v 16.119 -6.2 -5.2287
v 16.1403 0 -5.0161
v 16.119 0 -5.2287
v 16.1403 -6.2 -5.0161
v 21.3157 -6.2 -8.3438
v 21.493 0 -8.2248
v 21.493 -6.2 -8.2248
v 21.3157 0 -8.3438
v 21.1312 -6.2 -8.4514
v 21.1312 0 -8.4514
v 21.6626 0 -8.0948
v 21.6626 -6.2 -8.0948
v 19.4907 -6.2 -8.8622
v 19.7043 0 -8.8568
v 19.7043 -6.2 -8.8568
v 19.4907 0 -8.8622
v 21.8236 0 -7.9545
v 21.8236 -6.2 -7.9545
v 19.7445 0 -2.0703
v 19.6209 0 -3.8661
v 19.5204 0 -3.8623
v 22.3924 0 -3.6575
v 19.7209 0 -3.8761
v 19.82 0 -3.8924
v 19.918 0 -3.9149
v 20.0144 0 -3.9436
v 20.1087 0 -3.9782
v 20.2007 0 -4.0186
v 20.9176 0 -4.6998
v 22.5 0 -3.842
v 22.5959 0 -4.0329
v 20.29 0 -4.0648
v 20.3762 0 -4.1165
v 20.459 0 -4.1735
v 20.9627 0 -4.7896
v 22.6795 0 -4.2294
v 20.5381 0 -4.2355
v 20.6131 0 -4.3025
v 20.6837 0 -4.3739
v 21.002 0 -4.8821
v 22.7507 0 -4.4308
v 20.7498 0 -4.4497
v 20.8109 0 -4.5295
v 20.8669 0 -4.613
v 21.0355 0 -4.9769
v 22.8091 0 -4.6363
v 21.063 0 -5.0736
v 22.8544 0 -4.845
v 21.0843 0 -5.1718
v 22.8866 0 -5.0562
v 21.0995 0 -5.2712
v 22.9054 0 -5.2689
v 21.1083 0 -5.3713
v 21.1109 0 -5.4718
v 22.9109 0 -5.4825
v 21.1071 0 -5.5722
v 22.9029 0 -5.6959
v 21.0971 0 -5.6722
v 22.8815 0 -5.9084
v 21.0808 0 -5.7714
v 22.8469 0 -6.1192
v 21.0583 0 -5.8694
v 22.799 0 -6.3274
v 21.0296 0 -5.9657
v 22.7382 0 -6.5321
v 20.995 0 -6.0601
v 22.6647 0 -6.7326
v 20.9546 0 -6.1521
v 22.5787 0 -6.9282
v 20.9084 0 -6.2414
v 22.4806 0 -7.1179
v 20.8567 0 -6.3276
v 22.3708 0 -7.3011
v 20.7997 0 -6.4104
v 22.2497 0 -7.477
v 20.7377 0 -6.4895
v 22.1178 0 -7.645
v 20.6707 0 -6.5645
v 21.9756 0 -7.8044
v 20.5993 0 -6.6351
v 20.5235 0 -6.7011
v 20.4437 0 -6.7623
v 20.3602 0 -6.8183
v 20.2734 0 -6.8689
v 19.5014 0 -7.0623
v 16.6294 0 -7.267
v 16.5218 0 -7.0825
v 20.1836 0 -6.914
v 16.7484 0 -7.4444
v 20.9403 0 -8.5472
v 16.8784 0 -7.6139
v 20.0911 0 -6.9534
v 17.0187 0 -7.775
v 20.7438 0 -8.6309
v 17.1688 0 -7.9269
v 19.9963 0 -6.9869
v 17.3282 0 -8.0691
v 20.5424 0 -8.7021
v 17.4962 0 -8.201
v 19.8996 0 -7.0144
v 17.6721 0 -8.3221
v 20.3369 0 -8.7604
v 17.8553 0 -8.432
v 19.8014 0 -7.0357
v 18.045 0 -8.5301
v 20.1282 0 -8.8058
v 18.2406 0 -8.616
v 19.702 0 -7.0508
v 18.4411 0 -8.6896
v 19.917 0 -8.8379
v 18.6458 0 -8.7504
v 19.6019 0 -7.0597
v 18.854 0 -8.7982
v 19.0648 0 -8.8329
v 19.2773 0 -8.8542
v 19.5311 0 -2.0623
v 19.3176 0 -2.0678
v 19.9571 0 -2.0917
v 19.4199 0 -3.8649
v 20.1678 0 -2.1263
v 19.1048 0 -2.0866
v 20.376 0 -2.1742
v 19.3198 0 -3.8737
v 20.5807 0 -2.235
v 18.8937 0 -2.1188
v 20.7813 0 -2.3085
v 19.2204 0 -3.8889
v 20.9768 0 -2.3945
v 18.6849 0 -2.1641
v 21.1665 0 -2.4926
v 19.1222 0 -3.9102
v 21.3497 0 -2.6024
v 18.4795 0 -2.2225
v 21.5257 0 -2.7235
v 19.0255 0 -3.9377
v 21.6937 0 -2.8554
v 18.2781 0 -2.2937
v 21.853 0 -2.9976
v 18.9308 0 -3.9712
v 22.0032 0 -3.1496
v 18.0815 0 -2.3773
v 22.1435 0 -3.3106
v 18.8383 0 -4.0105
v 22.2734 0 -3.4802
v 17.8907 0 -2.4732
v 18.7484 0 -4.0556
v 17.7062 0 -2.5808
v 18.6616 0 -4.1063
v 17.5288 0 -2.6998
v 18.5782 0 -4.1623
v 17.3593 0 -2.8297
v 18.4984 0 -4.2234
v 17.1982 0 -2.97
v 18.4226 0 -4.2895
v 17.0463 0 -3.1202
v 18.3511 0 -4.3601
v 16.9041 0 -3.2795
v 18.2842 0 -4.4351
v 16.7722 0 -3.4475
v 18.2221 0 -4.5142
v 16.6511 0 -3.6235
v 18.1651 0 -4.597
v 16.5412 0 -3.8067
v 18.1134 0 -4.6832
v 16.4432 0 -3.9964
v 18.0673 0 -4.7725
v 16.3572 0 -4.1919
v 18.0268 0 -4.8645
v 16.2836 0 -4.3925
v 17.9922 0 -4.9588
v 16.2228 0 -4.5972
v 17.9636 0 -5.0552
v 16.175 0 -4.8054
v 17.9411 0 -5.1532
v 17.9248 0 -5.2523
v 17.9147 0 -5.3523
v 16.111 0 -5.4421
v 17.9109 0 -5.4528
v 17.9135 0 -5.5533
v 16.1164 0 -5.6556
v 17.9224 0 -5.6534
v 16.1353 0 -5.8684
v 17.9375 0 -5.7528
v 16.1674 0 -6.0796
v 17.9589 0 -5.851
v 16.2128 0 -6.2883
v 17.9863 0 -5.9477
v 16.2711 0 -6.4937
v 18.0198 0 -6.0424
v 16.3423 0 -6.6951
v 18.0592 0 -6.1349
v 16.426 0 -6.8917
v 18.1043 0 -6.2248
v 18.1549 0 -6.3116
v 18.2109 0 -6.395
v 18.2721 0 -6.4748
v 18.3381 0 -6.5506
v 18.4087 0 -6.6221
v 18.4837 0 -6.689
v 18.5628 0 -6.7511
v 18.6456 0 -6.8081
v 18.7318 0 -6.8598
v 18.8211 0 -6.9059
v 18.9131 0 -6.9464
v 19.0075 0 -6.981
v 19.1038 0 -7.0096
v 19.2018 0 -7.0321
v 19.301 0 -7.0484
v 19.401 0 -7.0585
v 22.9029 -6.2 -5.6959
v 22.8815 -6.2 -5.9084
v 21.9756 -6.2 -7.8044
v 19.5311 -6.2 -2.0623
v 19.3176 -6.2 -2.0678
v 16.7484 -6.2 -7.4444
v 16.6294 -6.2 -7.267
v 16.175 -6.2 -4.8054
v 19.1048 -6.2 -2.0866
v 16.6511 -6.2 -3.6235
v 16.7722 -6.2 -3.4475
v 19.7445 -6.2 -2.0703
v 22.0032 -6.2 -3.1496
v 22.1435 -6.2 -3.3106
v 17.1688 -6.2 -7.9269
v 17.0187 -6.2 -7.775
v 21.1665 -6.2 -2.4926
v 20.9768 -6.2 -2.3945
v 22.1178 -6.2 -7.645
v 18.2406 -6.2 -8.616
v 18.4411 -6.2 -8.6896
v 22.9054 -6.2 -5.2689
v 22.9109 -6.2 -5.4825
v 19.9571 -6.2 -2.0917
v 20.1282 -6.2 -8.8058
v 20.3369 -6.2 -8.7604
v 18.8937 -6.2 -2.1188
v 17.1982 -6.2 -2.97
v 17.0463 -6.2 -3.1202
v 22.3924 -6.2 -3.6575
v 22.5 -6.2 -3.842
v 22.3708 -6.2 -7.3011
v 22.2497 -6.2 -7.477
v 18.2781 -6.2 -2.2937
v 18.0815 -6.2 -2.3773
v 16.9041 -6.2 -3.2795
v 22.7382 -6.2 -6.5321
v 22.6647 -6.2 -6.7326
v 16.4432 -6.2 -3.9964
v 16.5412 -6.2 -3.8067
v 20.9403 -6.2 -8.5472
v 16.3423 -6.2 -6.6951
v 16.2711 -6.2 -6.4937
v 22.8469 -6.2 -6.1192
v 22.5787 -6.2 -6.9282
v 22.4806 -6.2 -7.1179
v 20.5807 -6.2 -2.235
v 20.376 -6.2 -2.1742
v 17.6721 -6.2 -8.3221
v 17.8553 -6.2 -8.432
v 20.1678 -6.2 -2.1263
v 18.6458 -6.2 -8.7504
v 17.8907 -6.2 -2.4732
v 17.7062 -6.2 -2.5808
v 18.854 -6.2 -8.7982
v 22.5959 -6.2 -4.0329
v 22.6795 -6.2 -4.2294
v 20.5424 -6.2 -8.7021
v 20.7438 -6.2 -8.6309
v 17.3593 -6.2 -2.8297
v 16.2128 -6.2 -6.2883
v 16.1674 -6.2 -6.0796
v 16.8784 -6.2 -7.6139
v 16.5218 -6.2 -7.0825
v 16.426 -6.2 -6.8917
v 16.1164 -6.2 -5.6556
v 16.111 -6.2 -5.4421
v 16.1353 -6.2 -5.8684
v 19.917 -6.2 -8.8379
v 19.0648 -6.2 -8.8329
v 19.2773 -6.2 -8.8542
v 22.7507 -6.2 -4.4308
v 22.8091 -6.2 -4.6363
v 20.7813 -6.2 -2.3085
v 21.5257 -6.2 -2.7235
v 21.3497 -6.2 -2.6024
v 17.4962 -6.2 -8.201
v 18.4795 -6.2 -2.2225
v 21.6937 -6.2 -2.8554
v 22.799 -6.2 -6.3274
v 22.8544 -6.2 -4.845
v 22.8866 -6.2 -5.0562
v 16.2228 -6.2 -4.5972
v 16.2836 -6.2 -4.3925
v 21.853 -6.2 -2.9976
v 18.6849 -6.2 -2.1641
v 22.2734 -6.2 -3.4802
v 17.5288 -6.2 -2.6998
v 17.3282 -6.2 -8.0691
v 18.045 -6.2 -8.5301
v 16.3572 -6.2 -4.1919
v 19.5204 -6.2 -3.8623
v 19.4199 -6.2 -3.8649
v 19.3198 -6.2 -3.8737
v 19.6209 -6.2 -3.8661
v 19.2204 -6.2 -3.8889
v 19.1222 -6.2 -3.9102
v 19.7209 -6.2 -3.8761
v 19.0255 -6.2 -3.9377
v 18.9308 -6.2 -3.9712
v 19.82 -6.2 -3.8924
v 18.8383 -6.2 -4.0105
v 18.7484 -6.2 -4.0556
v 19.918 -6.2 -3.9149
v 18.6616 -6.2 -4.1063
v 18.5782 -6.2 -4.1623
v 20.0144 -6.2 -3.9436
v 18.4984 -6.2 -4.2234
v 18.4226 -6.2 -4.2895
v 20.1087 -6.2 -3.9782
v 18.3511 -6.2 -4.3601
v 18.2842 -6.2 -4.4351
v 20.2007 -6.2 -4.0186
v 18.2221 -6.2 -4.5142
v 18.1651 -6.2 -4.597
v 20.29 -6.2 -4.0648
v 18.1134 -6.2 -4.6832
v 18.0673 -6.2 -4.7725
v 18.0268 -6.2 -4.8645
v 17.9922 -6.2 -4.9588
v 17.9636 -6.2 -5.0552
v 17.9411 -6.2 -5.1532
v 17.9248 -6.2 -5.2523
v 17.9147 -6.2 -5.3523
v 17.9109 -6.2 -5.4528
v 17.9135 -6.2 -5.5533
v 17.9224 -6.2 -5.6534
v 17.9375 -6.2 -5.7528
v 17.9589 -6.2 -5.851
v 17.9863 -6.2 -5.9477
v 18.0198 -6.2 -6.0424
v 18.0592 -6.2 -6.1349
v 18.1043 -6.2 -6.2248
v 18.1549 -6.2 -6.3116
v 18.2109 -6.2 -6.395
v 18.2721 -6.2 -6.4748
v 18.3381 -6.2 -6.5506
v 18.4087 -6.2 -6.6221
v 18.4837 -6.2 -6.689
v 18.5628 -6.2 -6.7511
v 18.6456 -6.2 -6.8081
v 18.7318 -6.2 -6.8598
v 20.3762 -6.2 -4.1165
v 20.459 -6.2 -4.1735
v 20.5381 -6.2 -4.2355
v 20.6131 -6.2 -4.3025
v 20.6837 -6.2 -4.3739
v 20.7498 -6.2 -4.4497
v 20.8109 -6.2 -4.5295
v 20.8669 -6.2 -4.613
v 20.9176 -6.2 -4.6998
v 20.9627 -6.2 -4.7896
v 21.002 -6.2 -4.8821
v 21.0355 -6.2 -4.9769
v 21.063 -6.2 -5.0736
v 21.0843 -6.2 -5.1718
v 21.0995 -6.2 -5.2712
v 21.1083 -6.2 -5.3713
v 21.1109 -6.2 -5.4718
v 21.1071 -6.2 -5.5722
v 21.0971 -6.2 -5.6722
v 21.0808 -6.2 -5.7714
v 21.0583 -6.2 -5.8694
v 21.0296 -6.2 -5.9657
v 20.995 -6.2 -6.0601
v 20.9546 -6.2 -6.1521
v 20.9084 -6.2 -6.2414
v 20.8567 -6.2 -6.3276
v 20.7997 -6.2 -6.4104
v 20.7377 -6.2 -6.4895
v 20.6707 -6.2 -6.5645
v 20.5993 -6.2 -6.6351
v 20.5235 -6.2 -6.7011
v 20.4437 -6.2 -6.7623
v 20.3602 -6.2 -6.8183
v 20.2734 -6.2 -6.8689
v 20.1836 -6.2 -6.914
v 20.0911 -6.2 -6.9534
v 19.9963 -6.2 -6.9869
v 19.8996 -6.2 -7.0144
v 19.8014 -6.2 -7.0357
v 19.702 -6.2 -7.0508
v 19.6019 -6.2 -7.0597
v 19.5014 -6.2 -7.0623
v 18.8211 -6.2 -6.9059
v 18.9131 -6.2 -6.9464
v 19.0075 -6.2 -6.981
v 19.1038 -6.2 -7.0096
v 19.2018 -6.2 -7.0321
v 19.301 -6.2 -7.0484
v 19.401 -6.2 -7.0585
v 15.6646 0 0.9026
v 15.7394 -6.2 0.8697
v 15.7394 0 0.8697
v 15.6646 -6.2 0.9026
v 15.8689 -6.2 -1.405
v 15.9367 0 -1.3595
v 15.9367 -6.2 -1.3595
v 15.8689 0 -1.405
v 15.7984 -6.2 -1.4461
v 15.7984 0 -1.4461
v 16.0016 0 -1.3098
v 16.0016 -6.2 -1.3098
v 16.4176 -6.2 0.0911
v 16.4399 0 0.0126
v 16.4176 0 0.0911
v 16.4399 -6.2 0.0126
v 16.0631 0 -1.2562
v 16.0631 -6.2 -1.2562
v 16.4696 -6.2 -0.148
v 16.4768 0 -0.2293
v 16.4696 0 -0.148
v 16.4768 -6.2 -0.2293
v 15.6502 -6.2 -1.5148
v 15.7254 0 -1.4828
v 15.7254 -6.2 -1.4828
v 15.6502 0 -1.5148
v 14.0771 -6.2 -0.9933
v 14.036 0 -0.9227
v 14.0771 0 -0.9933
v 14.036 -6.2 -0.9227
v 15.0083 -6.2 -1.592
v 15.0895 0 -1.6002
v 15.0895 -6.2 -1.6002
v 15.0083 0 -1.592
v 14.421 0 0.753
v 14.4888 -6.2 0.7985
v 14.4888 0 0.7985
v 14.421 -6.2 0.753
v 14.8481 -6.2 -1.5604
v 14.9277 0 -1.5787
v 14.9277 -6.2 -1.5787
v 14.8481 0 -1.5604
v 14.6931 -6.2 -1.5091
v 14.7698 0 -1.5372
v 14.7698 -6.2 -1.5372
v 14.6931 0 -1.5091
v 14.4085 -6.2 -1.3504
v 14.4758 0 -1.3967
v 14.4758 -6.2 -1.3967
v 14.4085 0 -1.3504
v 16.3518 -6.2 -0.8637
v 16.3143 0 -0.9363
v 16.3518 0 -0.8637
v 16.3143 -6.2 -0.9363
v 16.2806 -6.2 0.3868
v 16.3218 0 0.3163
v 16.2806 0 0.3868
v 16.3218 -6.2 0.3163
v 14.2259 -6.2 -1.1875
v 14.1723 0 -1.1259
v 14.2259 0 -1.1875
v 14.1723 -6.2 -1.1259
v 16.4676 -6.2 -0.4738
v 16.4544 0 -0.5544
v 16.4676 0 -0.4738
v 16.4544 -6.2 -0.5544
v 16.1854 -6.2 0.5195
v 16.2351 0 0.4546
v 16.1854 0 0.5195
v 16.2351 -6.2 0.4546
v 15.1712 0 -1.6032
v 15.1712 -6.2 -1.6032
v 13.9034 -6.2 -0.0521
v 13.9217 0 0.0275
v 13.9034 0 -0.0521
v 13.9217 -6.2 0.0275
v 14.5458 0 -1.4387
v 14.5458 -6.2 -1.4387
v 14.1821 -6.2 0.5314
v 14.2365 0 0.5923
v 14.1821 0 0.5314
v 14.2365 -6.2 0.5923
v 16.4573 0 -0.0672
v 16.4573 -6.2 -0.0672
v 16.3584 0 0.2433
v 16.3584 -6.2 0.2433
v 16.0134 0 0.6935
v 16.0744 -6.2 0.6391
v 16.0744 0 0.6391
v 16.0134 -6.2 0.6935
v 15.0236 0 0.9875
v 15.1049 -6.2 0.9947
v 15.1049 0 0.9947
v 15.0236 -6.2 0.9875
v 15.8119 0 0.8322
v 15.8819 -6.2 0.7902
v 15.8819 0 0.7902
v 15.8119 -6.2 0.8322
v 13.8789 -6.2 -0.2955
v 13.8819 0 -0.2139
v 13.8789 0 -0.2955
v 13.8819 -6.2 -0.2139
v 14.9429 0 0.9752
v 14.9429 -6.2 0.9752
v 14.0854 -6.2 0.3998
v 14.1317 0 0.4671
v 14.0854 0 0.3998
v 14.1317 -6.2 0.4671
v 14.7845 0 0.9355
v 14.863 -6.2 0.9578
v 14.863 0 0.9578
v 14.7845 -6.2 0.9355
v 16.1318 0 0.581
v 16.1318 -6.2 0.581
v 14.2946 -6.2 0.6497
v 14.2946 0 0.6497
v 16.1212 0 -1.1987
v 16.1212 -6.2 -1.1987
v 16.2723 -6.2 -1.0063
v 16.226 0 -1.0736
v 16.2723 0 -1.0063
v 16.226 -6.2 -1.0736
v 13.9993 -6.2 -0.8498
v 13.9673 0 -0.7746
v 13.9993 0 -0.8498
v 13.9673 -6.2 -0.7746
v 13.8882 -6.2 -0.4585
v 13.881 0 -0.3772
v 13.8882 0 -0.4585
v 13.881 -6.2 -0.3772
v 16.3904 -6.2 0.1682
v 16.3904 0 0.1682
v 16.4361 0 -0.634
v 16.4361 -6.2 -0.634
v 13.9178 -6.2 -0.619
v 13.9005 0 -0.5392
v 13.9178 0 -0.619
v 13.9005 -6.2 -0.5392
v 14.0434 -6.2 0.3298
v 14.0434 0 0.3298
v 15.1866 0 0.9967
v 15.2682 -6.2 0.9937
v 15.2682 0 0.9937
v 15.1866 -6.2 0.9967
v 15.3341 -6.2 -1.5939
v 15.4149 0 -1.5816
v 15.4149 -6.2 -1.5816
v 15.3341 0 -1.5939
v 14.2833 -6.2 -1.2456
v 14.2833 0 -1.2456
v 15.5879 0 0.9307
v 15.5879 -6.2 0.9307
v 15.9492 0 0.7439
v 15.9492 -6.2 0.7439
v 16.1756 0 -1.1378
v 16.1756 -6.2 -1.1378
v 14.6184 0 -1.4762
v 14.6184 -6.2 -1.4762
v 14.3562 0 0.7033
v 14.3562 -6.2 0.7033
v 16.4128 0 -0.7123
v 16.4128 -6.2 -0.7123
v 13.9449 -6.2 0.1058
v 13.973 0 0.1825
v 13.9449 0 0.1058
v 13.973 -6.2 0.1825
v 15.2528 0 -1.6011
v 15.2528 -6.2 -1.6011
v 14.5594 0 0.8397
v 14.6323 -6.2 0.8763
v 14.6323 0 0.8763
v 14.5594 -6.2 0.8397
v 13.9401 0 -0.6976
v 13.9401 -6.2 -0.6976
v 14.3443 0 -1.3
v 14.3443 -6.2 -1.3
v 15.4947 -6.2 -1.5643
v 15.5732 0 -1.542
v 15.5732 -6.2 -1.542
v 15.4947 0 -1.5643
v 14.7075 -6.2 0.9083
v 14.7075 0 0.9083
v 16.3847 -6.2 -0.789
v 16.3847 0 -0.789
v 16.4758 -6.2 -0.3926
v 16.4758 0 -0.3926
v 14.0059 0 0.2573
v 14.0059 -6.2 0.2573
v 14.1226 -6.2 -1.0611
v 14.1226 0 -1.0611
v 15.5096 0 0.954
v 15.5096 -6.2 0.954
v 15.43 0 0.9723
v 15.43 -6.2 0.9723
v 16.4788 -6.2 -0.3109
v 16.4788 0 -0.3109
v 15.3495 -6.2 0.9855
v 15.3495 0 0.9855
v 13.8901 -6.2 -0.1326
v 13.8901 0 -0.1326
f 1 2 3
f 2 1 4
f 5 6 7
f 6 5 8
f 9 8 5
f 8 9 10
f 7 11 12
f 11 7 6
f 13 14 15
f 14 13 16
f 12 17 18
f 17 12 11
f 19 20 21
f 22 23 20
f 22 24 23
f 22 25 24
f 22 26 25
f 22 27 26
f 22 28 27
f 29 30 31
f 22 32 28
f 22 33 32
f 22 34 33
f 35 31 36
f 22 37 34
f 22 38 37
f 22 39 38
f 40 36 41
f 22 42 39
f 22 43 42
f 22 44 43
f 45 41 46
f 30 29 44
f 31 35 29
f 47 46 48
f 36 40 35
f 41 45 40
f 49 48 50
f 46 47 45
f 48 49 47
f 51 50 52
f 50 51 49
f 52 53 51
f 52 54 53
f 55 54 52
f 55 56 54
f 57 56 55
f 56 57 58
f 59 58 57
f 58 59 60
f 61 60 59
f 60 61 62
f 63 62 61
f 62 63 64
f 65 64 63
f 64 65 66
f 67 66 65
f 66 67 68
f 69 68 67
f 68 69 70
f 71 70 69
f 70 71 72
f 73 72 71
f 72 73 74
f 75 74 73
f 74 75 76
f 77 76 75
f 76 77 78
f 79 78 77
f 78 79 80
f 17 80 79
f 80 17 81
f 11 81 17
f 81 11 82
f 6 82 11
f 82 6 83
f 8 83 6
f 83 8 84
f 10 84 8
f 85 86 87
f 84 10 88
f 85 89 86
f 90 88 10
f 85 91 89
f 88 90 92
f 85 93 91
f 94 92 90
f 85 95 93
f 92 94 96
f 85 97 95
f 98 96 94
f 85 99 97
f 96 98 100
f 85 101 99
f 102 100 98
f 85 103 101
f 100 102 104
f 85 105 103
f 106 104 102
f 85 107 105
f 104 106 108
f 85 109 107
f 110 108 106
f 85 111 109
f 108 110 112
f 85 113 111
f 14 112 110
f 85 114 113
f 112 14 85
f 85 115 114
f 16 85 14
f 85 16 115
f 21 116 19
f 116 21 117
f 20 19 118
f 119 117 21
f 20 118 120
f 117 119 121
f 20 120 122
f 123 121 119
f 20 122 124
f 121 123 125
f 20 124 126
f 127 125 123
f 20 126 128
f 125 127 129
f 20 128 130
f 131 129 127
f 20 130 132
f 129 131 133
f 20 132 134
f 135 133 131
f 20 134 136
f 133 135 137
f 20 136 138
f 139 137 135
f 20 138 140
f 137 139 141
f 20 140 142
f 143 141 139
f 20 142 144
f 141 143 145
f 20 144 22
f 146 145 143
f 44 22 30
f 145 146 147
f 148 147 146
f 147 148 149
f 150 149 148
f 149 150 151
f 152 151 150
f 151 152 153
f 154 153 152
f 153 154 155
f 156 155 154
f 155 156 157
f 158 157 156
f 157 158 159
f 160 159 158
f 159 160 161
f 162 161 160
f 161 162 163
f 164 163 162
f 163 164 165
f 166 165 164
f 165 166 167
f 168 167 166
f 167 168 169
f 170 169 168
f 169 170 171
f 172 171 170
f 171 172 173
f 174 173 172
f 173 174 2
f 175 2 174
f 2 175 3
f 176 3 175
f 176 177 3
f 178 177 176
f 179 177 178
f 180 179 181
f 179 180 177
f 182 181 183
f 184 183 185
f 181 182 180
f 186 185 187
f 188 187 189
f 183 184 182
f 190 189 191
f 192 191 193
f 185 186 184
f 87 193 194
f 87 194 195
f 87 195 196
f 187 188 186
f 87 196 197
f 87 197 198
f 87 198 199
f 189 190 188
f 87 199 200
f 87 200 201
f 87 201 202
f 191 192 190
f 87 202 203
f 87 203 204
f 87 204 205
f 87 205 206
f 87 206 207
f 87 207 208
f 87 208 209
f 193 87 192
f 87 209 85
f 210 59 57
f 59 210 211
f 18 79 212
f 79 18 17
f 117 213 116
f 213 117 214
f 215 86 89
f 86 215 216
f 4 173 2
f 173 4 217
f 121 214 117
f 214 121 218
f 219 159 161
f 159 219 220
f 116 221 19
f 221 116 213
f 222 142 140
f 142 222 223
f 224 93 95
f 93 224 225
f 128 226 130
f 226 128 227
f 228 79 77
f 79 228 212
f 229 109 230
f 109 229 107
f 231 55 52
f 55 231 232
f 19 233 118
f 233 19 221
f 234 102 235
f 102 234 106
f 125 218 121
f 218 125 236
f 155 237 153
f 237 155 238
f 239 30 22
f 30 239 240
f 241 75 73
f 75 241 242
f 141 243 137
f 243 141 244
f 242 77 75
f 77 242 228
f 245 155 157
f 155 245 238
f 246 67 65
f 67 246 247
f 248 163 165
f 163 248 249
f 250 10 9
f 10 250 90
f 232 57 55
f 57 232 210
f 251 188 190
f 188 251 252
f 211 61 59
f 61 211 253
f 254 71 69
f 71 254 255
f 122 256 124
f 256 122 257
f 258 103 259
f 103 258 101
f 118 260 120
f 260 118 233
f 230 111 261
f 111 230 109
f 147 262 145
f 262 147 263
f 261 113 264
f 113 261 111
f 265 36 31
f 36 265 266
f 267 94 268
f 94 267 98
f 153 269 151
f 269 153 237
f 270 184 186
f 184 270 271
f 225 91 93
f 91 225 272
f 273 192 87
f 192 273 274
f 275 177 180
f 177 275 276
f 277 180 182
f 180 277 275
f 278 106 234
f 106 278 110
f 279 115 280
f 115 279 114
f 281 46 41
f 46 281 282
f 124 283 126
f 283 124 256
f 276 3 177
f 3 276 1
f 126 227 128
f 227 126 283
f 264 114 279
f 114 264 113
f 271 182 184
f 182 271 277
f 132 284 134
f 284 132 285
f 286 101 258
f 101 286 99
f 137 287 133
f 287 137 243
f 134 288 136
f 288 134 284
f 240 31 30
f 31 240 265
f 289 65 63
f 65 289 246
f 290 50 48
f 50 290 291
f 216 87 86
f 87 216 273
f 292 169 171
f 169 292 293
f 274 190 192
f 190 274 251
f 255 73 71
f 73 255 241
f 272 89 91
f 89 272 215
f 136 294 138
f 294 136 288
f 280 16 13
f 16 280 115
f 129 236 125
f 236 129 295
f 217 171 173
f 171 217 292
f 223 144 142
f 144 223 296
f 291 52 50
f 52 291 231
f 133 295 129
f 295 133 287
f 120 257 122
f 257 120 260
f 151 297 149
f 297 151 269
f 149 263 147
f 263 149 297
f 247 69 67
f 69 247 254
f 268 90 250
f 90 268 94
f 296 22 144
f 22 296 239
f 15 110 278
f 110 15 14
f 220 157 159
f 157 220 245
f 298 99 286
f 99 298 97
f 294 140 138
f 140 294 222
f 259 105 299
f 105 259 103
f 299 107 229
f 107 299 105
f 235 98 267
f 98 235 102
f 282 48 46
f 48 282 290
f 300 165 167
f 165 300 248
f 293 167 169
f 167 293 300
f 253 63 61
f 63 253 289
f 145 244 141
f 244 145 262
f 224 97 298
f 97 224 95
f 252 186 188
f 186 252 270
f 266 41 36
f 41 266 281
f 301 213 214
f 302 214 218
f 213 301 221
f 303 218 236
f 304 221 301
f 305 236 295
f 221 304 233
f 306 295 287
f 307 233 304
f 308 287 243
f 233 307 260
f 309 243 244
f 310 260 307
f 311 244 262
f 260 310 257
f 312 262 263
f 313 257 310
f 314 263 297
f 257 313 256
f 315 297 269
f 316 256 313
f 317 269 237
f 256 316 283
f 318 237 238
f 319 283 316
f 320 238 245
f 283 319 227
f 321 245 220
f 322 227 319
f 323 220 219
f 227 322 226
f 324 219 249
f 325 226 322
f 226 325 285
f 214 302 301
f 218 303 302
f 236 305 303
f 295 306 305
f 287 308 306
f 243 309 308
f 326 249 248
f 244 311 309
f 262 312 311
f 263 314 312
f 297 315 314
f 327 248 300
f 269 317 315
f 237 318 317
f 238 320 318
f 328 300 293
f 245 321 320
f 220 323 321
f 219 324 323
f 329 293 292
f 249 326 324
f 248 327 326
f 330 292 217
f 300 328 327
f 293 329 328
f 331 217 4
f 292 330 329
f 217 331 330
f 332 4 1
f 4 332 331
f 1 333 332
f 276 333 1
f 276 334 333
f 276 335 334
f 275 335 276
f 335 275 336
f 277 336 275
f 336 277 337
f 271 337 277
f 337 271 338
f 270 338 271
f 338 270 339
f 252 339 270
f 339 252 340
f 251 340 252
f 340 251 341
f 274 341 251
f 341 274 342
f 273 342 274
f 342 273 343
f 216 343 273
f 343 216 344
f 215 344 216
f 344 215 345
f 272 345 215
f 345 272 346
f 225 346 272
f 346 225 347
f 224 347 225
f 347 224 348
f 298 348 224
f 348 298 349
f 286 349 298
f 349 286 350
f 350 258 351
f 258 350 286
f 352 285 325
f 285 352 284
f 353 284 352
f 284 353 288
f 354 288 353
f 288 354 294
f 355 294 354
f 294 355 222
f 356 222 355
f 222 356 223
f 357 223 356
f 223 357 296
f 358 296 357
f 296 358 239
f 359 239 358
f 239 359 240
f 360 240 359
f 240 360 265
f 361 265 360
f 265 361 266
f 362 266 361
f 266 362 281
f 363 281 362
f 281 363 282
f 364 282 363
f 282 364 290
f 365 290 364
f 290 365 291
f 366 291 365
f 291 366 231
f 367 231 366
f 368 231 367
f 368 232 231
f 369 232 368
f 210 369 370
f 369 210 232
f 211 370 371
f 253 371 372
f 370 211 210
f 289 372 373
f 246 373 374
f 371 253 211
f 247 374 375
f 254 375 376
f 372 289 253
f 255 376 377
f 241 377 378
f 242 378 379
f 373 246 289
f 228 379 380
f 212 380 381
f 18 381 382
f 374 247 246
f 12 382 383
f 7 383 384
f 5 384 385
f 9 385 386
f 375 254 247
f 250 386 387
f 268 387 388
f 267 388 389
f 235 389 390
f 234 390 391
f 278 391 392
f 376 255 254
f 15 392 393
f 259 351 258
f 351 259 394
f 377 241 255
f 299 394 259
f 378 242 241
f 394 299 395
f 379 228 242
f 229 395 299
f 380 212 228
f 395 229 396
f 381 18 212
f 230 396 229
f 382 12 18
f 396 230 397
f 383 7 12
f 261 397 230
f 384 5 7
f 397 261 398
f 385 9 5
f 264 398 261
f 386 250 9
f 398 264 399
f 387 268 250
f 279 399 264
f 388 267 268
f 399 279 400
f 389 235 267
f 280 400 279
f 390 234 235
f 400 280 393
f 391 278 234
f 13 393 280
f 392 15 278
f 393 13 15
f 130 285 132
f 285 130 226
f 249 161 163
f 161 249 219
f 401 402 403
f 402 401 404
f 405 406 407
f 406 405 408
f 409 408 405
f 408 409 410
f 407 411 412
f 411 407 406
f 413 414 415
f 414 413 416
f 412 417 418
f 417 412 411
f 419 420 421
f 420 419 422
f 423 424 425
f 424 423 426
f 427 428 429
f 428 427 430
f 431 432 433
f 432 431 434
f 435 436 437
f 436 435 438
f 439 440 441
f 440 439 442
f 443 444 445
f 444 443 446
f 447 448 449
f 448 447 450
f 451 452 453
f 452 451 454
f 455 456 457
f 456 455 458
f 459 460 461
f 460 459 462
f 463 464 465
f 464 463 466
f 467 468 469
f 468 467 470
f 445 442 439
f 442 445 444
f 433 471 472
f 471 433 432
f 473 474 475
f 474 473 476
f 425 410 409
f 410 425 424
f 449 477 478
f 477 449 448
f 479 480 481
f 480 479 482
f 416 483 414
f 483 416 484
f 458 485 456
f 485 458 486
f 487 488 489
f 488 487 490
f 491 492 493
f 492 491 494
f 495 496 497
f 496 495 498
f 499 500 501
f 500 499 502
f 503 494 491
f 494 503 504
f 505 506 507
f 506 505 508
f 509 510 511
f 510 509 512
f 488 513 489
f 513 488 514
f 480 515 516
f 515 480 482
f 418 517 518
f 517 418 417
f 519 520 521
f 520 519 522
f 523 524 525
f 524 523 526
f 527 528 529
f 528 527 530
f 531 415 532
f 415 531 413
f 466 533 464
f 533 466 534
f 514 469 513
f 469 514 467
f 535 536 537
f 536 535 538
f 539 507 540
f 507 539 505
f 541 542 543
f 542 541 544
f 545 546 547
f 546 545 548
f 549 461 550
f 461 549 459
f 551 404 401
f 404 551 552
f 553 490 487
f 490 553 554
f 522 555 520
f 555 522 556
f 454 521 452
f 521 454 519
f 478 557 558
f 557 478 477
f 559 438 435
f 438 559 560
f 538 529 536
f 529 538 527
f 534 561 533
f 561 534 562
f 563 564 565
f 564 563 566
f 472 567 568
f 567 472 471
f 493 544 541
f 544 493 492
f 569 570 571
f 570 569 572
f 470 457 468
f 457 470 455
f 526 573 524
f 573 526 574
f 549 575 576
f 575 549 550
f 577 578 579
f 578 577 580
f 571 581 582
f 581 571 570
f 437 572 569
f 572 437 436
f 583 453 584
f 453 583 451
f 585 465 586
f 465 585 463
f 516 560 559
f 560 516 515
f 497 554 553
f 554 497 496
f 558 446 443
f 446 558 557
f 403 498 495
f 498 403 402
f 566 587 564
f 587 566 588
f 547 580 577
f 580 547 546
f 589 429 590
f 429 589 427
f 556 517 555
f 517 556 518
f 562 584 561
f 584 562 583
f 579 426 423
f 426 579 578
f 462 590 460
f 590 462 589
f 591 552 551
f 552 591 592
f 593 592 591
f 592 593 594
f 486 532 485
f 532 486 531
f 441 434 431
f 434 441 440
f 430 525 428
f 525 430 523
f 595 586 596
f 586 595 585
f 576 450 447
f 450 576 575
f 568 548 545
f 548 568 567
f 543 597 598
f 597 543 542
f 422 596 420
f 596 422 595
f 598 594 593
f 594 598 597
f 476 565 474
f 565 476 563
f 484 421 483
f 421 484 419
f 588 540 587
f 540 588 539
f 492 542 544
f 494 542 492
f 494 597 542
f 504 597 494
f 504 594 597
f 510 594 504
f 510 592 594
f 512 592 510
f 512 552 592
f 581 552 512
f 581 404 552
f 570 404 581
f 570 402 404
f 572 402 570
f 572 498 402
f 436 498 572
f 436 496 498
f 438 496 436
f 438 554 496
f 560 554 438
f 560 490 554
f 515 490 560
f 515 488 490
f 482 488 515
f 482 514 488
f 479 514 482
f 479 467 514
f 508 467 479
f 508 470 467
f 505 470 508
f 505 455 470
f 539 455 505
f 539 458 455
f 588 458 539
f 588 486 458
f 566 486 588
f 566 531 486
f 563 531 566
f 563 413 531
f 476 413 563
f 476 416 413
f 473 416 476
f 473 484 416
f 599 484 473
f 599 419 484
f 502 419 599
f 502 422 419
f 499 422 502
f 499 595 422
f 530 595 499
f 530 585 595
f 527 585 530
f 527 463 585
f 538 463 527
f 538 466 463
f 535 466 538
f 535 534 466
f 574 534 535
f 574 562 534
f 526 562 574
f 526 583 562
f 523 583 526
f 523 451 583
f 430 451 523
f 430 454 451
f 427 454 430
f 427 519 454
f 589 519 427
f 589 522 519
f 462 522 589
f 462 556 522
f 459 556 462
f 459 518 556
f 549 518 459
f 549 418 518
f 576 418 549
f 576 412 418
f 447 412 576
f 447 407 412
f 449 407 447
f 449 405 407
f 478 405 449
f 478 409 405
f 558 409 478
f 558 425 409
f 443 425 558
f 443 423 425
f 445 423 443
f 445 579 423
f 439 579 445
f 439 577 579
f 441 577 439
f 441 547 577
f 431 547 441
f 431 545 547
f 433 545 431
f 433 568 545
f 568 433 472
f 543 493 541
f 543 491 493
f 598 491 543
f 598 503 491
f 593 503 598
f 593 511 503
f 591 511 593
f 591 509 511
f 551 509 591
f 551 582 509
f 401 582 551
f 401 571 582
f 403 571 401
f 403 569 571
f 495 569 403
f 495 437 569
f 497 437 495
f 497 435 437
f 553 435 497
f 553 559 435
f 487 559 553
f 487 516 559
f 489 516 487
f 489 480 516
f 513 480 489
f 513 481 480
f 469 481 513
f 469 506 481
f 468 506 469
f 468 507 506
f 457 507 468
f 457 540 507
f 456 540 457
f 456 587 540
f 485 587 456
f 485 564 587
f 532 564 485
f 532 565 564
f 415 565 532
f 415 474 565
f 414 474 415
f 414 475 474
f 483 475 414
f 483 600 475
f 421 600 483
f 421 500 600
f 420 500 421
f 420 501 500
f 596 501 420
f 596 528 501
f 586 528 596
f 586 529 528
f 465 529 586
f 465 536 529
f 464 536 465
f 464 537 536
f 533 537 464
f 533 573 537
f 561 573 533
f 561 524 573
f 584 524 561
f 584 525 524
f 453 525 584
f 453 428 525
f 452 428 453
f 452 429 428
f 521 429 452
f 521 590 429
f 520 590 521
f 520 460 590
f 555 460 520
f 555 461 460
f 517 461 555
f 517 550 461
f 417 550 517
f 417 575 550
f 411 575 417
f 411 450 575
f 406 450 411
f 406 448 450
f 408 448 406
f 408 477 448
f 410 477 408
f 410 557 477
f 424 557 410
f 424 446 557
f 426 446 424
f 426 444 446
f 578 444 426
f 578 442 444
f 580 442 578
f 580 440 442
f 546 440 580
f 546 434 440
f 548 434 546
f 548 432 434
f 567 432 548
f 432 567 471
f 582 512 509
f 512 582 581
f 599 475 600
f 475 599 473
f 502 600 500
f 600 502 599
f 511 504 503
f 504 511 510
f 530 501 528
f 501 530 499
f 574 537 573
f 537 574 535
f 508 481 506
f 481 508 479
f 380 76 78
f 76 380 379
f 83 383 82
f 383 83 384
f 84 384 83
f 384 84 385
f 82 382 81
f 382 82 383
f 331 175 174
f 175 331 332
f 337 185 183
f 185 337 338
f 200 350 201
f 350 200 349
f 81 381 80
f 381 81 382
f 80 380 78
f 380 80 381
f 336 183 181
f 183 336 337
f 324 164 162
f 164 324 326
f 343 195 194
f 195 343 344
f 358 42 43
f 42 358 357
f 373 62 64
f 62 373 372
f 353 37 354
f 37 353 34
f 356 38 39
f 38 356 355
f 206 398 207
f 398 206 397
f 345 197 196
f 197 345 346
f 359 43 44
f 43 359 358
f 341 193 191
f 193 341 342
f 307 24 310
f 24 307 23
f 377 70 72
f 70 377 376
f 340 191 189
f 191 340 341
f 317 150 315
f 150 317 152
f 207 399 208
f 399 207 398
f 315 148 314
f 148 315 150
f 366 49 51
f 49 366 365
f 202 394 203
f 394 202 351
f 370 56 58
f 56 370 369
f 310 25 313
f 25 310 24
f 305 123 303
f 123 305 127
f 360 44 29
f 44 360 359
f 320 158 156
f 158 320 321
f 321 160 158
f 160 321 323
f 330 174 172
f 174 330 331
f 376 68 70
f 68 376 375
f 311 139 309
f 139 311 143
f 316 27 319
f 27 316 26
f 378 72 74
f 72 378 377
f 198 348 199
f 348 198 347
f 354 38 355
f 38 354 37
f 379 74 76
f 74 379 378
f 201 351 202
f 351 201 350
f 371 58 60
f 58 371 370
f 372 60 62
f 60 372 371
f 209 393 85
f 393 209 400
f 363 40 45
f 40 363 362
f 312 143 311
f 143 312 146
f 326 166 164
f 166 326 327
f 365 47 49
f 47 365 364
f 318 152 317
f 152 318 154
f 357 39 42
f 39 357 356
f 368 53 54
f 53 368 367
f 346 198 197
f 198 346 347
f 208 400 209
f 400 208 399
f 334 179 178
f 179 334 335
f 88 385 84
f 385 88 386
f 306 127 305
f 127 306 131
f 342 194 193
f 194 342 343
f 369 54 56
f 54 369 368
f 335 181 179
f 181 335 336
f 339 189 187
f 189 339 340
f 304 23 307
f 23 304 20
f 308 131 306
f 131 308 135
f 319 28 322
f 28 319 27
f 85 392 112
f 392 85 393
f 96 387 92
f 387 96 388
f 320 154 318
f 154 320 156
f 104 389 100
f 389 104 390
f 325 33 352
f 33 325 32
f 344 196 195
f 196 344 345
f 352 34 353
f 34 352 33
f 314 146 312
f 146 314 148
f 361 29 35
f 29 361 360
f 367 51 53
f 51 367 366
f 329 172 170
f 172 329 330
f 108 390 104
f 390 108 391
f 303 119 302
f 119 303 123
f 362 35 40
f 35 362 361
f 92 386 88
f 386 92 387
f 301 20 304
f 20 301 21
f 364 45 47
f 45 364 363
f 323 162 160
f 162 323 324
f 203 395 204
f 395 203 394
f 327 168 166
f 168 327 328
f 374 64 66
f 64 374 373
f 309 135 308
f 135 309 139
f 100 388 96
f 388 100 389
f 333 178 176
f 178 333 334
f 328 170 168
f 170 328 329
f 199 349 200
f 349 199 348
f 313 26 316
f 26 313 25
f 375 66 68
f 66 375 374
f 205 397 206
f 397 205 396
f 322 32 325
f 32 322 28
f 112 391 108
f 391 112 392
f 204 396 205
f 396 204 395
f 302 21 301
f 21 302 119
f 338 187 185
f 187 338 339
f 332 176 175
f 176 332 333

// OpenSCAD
$fn=100;


color([1, 1, 1,0.3])
*translate([5,0,-5])
	cube([5,18,5]);


rotate(90,[1,0,0])
rotate(-61.54,[0,0,1])
trigger_mech();



module trigger_mech()
{
	height=4.3;

	do=6.8;
	di=3.2;
	dh=6.2;
	xyz=[14.1,14.55,0];

	difference()
	{
		union()
		{
			linear_extrude(height)
			{
				scale(0.0365)
				import("profiles/trigger_mech.dxf");
			}

			l=12/1000;
			translate([578*l,1348*l,-7+height])
			color("cyan")
			linear_extrude(7)
			{
				scale(0.05)
				import("profiles/trigger_mech_thing.dxf");
			}

			color("green")
			translate(xyz)
				cylinder(dh, d=do);

			color("green")
			translate([7.5,13.2,0])
				cylinder(dh, d=2.6);
		}

		translate(xyz)
			cylinder(dh+1, d=di);

		union()
		{
			assign(xyz=[4.5,5,-1],
				d=5, delta=[2,-1,0])
			{
				hull()
				{
					translate(xyz)
						cylinder(dh+1, d=d);
					
					translate([
			xyz[0]+delta[0],
			xyz[1]+delta[1],
			xyz[2]+delta[2]])
						cylinder(dh+1, d=d);
				}
			}
			
		}
	}
}
